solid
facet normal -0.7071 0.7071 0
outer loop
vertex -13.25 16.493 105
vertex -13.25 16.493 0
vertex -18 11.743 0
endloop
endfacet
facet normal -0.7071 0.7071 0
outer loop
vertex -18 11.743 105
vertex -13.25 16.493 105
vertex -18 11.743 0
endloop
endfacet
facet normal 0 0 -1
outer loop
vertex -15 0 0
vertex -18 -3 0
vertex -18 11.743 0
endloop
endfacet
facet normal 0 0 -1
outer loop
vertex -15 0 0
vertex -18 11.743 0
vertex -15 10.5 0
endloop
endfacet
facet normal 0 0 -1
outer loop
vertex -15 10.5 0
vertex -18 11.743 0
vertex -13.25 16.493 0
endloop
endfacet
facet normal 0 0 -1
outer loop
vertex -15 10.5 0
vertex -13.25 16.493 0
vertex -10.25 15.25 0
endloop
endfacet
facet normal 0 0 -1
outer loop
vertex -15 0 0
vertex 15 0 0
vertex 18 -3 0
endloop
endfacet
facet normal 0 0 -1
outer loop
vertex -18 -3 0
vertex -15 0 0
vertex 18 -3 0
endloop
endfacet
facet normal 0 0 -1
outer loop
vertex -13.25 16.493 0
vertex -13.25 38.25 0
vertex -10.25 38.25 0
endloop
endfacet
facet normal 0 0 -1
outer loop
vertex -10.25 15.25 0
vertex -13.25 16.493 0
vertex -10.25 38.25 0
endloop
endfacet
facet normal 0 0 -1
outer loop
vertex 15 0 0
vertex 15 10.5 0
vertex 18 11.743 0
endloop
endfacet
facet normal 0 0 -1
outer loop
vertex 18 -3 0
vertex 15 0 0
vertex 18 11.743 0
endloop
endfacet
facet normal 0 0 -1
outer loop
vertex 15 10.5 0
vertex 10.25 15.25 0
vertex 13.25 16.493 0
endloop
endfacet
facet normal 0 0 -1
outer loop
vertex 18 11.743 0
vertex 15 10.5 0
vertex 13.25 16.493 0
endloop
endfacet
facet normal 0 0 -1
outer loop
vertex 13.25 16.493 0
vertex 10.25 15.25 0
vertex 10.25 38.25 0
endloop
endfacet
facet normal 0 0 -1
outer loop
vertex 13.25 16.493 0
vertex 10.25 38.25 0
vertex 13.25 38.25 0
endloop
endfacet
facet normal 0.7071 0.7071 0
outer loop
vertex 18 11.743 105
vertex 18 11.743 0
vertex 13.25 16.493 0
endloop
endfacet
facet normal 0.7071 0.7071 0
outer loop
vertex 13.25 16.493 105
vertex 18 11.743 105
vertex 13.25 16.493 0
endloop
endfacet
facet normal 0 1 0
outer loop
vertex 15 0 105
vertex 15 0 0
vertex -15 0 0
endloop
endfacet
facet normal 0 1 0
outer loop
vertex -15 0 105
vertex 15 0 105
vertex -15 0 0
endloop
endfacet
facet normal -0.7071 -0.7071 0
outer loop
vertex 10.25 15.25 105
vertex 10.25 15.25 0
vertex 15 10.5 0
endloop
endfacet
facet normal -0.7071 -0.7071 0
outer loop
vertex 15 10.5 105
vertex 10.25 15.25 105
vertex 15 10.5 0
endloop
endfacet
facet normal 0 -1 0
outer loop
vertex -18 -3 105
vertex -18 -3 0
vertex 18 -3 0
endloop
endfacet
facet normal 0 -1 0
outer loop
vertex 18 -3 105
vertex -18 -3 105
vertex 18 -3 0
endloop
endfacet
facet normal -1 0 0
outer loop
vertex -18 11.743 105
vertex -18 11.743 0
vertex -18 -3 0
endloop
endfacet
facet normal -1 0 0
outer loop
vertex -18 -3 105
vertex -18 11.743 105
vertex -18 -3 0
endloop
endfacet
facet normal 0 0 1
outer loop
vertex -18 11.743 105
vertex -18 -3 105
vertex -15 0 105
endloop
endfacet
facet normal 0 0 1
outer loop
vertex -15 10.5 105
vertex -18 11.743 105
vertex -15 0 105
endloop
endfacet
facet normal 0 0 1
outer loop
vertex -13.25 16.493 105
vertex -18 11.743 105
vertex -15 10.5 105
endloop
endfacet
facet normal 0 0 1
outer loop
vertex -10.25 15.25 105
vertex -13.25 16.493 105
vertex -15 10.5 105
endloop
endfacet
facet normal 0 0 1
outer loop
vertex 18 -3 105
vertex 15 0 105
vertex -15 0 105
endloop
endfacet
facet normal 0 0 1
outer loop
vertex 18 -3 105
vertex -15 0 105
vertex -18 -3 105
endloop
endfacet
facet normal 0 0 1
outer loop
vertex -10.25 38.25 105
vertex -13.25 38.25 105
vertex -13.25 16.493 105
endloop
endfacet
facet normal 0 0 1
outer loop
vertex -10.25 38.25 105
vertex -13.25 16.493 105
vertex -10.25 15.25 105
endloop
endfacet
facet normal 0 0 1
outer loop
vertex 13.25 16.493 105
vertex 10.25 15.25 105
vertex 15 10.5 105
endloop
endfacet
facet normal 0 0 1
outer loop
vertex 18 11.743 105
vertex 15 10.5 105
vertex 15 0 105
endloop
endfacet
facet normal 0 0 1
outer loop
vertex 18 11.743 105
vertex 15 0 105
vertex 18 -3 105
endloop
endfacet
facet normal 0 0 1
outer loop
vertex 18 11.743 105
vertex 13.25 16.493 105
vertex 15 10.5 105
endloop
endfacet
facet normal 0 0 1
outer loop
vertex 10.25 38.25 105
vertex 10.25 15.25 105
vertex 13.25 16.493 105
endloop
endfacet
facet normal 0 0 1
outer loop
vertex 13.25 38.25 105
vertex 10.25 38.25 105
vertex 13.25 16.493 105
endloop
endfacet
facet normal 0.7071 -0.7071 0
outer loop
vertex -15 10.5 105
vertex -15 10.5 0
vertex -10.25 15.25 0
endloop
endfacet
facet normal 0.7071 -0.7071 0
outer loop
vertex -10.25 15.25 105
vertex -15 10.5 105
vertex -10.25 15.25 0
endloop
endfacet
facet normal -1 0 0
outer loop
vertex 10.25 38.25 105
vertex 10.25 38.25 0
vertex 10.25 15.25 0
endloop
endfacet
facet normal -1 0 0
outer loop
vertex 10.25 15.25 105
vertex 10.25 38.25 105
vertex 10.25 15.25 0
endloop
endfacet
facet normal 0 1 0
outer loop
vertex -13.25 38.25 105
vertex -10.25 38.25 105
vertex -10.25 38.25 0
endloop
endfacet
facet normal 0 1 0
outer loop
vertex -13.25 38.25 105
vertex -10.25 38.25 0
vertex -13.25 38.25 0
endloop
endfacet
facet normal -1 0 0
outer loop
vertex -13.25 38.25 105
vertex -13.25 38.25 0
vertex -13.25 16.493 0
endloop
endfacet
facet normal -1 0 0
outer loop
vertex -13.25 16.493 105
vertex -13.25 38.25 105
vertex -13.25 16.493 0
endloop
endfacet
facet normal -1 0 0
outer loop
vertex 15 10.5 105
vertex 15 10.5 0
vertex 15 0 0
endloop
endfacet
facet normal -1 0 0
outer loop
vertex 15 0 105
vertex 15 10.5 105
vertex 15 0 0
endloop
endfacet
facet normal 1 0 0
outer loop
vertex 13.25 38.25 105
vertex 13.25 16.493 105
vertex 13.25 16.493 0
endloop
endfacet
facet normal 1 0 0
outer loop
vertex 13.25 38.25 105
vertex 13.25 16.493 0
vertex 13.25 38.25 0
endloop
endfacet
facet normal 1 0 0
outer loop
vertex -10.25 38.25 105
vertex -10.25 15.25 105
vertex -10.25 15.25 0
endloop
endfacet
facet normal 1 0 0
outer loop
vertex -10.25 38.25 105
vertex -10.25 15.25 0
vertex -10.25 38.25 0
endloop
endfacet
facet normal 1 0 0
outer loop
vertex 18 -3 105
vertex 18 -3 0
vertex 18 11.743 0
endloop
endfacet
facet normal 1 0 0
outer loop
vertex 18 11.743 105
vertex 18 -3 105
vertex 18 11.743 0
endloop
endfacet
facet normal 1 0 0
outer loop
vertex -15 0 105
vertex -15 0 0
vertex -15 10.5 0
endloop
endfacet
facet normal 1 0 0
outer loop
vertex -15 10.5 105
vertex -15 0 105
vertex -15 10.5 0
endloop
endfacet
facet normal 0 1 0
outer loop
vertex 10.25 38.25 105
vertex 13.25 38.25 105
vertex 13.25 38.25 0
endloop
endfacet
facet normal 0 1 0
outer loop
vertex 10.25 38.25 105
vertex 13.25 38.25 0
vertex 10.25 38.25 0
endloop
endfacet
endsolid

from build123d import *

# Parameters (mm, degrees)
BOSS_EXTRUDE1_DEPTH     = 105
SKETCH2_W               = 20.5
SKETCH2_H               = 3
CUT_EXTRUDE1_DEPTH      = 1
CUT_EXTRUDE1_DEPTH_BACK = 106


with BuildPart() as part:
    # Sketch1 → Boss-Extrude1 (new body)
    with BuildSketch(Plane.XY):
        Polygon((18, 11.742640687), (13.25, 16.492640687), (13.25, 38.25), (-13.25, 38.25), (-13.25, 16.492640687), (-18, 11.742640687), (-18, -3), (18, -3), align=None)
        Polygon((15, 0), (-15, 0), (-15, 10.5), (-10.25, 15.25), (-10.25, 35.25), (10.25, 35.25), (10.25, 15.25), (15, 10.5), align=None, mode=Mode.SUBTRACT)
    extrude(amount=BOSS_EXTRUDE1_DEPTH)

    # Sketch2 → Cut-Extrude1 (cut, two sides)
    with BuildSketch(Plane.XY.offset(105)) as cut_extrude1_sk:
        with Locations((0, 36.75)):
            Rectangle(SKETCH2_W, SKETCH2_H)
    extrude(amount=CUT_EXTRUDE1_DEPTH, mode=Mode.SUBTRACT)
    extrude(cut_extrude1_sk.sketch, amount=-CUT_EXTRUDE1_DEPTH_BACK, mode=Mode.SUBTRACT)


solid = part.part
